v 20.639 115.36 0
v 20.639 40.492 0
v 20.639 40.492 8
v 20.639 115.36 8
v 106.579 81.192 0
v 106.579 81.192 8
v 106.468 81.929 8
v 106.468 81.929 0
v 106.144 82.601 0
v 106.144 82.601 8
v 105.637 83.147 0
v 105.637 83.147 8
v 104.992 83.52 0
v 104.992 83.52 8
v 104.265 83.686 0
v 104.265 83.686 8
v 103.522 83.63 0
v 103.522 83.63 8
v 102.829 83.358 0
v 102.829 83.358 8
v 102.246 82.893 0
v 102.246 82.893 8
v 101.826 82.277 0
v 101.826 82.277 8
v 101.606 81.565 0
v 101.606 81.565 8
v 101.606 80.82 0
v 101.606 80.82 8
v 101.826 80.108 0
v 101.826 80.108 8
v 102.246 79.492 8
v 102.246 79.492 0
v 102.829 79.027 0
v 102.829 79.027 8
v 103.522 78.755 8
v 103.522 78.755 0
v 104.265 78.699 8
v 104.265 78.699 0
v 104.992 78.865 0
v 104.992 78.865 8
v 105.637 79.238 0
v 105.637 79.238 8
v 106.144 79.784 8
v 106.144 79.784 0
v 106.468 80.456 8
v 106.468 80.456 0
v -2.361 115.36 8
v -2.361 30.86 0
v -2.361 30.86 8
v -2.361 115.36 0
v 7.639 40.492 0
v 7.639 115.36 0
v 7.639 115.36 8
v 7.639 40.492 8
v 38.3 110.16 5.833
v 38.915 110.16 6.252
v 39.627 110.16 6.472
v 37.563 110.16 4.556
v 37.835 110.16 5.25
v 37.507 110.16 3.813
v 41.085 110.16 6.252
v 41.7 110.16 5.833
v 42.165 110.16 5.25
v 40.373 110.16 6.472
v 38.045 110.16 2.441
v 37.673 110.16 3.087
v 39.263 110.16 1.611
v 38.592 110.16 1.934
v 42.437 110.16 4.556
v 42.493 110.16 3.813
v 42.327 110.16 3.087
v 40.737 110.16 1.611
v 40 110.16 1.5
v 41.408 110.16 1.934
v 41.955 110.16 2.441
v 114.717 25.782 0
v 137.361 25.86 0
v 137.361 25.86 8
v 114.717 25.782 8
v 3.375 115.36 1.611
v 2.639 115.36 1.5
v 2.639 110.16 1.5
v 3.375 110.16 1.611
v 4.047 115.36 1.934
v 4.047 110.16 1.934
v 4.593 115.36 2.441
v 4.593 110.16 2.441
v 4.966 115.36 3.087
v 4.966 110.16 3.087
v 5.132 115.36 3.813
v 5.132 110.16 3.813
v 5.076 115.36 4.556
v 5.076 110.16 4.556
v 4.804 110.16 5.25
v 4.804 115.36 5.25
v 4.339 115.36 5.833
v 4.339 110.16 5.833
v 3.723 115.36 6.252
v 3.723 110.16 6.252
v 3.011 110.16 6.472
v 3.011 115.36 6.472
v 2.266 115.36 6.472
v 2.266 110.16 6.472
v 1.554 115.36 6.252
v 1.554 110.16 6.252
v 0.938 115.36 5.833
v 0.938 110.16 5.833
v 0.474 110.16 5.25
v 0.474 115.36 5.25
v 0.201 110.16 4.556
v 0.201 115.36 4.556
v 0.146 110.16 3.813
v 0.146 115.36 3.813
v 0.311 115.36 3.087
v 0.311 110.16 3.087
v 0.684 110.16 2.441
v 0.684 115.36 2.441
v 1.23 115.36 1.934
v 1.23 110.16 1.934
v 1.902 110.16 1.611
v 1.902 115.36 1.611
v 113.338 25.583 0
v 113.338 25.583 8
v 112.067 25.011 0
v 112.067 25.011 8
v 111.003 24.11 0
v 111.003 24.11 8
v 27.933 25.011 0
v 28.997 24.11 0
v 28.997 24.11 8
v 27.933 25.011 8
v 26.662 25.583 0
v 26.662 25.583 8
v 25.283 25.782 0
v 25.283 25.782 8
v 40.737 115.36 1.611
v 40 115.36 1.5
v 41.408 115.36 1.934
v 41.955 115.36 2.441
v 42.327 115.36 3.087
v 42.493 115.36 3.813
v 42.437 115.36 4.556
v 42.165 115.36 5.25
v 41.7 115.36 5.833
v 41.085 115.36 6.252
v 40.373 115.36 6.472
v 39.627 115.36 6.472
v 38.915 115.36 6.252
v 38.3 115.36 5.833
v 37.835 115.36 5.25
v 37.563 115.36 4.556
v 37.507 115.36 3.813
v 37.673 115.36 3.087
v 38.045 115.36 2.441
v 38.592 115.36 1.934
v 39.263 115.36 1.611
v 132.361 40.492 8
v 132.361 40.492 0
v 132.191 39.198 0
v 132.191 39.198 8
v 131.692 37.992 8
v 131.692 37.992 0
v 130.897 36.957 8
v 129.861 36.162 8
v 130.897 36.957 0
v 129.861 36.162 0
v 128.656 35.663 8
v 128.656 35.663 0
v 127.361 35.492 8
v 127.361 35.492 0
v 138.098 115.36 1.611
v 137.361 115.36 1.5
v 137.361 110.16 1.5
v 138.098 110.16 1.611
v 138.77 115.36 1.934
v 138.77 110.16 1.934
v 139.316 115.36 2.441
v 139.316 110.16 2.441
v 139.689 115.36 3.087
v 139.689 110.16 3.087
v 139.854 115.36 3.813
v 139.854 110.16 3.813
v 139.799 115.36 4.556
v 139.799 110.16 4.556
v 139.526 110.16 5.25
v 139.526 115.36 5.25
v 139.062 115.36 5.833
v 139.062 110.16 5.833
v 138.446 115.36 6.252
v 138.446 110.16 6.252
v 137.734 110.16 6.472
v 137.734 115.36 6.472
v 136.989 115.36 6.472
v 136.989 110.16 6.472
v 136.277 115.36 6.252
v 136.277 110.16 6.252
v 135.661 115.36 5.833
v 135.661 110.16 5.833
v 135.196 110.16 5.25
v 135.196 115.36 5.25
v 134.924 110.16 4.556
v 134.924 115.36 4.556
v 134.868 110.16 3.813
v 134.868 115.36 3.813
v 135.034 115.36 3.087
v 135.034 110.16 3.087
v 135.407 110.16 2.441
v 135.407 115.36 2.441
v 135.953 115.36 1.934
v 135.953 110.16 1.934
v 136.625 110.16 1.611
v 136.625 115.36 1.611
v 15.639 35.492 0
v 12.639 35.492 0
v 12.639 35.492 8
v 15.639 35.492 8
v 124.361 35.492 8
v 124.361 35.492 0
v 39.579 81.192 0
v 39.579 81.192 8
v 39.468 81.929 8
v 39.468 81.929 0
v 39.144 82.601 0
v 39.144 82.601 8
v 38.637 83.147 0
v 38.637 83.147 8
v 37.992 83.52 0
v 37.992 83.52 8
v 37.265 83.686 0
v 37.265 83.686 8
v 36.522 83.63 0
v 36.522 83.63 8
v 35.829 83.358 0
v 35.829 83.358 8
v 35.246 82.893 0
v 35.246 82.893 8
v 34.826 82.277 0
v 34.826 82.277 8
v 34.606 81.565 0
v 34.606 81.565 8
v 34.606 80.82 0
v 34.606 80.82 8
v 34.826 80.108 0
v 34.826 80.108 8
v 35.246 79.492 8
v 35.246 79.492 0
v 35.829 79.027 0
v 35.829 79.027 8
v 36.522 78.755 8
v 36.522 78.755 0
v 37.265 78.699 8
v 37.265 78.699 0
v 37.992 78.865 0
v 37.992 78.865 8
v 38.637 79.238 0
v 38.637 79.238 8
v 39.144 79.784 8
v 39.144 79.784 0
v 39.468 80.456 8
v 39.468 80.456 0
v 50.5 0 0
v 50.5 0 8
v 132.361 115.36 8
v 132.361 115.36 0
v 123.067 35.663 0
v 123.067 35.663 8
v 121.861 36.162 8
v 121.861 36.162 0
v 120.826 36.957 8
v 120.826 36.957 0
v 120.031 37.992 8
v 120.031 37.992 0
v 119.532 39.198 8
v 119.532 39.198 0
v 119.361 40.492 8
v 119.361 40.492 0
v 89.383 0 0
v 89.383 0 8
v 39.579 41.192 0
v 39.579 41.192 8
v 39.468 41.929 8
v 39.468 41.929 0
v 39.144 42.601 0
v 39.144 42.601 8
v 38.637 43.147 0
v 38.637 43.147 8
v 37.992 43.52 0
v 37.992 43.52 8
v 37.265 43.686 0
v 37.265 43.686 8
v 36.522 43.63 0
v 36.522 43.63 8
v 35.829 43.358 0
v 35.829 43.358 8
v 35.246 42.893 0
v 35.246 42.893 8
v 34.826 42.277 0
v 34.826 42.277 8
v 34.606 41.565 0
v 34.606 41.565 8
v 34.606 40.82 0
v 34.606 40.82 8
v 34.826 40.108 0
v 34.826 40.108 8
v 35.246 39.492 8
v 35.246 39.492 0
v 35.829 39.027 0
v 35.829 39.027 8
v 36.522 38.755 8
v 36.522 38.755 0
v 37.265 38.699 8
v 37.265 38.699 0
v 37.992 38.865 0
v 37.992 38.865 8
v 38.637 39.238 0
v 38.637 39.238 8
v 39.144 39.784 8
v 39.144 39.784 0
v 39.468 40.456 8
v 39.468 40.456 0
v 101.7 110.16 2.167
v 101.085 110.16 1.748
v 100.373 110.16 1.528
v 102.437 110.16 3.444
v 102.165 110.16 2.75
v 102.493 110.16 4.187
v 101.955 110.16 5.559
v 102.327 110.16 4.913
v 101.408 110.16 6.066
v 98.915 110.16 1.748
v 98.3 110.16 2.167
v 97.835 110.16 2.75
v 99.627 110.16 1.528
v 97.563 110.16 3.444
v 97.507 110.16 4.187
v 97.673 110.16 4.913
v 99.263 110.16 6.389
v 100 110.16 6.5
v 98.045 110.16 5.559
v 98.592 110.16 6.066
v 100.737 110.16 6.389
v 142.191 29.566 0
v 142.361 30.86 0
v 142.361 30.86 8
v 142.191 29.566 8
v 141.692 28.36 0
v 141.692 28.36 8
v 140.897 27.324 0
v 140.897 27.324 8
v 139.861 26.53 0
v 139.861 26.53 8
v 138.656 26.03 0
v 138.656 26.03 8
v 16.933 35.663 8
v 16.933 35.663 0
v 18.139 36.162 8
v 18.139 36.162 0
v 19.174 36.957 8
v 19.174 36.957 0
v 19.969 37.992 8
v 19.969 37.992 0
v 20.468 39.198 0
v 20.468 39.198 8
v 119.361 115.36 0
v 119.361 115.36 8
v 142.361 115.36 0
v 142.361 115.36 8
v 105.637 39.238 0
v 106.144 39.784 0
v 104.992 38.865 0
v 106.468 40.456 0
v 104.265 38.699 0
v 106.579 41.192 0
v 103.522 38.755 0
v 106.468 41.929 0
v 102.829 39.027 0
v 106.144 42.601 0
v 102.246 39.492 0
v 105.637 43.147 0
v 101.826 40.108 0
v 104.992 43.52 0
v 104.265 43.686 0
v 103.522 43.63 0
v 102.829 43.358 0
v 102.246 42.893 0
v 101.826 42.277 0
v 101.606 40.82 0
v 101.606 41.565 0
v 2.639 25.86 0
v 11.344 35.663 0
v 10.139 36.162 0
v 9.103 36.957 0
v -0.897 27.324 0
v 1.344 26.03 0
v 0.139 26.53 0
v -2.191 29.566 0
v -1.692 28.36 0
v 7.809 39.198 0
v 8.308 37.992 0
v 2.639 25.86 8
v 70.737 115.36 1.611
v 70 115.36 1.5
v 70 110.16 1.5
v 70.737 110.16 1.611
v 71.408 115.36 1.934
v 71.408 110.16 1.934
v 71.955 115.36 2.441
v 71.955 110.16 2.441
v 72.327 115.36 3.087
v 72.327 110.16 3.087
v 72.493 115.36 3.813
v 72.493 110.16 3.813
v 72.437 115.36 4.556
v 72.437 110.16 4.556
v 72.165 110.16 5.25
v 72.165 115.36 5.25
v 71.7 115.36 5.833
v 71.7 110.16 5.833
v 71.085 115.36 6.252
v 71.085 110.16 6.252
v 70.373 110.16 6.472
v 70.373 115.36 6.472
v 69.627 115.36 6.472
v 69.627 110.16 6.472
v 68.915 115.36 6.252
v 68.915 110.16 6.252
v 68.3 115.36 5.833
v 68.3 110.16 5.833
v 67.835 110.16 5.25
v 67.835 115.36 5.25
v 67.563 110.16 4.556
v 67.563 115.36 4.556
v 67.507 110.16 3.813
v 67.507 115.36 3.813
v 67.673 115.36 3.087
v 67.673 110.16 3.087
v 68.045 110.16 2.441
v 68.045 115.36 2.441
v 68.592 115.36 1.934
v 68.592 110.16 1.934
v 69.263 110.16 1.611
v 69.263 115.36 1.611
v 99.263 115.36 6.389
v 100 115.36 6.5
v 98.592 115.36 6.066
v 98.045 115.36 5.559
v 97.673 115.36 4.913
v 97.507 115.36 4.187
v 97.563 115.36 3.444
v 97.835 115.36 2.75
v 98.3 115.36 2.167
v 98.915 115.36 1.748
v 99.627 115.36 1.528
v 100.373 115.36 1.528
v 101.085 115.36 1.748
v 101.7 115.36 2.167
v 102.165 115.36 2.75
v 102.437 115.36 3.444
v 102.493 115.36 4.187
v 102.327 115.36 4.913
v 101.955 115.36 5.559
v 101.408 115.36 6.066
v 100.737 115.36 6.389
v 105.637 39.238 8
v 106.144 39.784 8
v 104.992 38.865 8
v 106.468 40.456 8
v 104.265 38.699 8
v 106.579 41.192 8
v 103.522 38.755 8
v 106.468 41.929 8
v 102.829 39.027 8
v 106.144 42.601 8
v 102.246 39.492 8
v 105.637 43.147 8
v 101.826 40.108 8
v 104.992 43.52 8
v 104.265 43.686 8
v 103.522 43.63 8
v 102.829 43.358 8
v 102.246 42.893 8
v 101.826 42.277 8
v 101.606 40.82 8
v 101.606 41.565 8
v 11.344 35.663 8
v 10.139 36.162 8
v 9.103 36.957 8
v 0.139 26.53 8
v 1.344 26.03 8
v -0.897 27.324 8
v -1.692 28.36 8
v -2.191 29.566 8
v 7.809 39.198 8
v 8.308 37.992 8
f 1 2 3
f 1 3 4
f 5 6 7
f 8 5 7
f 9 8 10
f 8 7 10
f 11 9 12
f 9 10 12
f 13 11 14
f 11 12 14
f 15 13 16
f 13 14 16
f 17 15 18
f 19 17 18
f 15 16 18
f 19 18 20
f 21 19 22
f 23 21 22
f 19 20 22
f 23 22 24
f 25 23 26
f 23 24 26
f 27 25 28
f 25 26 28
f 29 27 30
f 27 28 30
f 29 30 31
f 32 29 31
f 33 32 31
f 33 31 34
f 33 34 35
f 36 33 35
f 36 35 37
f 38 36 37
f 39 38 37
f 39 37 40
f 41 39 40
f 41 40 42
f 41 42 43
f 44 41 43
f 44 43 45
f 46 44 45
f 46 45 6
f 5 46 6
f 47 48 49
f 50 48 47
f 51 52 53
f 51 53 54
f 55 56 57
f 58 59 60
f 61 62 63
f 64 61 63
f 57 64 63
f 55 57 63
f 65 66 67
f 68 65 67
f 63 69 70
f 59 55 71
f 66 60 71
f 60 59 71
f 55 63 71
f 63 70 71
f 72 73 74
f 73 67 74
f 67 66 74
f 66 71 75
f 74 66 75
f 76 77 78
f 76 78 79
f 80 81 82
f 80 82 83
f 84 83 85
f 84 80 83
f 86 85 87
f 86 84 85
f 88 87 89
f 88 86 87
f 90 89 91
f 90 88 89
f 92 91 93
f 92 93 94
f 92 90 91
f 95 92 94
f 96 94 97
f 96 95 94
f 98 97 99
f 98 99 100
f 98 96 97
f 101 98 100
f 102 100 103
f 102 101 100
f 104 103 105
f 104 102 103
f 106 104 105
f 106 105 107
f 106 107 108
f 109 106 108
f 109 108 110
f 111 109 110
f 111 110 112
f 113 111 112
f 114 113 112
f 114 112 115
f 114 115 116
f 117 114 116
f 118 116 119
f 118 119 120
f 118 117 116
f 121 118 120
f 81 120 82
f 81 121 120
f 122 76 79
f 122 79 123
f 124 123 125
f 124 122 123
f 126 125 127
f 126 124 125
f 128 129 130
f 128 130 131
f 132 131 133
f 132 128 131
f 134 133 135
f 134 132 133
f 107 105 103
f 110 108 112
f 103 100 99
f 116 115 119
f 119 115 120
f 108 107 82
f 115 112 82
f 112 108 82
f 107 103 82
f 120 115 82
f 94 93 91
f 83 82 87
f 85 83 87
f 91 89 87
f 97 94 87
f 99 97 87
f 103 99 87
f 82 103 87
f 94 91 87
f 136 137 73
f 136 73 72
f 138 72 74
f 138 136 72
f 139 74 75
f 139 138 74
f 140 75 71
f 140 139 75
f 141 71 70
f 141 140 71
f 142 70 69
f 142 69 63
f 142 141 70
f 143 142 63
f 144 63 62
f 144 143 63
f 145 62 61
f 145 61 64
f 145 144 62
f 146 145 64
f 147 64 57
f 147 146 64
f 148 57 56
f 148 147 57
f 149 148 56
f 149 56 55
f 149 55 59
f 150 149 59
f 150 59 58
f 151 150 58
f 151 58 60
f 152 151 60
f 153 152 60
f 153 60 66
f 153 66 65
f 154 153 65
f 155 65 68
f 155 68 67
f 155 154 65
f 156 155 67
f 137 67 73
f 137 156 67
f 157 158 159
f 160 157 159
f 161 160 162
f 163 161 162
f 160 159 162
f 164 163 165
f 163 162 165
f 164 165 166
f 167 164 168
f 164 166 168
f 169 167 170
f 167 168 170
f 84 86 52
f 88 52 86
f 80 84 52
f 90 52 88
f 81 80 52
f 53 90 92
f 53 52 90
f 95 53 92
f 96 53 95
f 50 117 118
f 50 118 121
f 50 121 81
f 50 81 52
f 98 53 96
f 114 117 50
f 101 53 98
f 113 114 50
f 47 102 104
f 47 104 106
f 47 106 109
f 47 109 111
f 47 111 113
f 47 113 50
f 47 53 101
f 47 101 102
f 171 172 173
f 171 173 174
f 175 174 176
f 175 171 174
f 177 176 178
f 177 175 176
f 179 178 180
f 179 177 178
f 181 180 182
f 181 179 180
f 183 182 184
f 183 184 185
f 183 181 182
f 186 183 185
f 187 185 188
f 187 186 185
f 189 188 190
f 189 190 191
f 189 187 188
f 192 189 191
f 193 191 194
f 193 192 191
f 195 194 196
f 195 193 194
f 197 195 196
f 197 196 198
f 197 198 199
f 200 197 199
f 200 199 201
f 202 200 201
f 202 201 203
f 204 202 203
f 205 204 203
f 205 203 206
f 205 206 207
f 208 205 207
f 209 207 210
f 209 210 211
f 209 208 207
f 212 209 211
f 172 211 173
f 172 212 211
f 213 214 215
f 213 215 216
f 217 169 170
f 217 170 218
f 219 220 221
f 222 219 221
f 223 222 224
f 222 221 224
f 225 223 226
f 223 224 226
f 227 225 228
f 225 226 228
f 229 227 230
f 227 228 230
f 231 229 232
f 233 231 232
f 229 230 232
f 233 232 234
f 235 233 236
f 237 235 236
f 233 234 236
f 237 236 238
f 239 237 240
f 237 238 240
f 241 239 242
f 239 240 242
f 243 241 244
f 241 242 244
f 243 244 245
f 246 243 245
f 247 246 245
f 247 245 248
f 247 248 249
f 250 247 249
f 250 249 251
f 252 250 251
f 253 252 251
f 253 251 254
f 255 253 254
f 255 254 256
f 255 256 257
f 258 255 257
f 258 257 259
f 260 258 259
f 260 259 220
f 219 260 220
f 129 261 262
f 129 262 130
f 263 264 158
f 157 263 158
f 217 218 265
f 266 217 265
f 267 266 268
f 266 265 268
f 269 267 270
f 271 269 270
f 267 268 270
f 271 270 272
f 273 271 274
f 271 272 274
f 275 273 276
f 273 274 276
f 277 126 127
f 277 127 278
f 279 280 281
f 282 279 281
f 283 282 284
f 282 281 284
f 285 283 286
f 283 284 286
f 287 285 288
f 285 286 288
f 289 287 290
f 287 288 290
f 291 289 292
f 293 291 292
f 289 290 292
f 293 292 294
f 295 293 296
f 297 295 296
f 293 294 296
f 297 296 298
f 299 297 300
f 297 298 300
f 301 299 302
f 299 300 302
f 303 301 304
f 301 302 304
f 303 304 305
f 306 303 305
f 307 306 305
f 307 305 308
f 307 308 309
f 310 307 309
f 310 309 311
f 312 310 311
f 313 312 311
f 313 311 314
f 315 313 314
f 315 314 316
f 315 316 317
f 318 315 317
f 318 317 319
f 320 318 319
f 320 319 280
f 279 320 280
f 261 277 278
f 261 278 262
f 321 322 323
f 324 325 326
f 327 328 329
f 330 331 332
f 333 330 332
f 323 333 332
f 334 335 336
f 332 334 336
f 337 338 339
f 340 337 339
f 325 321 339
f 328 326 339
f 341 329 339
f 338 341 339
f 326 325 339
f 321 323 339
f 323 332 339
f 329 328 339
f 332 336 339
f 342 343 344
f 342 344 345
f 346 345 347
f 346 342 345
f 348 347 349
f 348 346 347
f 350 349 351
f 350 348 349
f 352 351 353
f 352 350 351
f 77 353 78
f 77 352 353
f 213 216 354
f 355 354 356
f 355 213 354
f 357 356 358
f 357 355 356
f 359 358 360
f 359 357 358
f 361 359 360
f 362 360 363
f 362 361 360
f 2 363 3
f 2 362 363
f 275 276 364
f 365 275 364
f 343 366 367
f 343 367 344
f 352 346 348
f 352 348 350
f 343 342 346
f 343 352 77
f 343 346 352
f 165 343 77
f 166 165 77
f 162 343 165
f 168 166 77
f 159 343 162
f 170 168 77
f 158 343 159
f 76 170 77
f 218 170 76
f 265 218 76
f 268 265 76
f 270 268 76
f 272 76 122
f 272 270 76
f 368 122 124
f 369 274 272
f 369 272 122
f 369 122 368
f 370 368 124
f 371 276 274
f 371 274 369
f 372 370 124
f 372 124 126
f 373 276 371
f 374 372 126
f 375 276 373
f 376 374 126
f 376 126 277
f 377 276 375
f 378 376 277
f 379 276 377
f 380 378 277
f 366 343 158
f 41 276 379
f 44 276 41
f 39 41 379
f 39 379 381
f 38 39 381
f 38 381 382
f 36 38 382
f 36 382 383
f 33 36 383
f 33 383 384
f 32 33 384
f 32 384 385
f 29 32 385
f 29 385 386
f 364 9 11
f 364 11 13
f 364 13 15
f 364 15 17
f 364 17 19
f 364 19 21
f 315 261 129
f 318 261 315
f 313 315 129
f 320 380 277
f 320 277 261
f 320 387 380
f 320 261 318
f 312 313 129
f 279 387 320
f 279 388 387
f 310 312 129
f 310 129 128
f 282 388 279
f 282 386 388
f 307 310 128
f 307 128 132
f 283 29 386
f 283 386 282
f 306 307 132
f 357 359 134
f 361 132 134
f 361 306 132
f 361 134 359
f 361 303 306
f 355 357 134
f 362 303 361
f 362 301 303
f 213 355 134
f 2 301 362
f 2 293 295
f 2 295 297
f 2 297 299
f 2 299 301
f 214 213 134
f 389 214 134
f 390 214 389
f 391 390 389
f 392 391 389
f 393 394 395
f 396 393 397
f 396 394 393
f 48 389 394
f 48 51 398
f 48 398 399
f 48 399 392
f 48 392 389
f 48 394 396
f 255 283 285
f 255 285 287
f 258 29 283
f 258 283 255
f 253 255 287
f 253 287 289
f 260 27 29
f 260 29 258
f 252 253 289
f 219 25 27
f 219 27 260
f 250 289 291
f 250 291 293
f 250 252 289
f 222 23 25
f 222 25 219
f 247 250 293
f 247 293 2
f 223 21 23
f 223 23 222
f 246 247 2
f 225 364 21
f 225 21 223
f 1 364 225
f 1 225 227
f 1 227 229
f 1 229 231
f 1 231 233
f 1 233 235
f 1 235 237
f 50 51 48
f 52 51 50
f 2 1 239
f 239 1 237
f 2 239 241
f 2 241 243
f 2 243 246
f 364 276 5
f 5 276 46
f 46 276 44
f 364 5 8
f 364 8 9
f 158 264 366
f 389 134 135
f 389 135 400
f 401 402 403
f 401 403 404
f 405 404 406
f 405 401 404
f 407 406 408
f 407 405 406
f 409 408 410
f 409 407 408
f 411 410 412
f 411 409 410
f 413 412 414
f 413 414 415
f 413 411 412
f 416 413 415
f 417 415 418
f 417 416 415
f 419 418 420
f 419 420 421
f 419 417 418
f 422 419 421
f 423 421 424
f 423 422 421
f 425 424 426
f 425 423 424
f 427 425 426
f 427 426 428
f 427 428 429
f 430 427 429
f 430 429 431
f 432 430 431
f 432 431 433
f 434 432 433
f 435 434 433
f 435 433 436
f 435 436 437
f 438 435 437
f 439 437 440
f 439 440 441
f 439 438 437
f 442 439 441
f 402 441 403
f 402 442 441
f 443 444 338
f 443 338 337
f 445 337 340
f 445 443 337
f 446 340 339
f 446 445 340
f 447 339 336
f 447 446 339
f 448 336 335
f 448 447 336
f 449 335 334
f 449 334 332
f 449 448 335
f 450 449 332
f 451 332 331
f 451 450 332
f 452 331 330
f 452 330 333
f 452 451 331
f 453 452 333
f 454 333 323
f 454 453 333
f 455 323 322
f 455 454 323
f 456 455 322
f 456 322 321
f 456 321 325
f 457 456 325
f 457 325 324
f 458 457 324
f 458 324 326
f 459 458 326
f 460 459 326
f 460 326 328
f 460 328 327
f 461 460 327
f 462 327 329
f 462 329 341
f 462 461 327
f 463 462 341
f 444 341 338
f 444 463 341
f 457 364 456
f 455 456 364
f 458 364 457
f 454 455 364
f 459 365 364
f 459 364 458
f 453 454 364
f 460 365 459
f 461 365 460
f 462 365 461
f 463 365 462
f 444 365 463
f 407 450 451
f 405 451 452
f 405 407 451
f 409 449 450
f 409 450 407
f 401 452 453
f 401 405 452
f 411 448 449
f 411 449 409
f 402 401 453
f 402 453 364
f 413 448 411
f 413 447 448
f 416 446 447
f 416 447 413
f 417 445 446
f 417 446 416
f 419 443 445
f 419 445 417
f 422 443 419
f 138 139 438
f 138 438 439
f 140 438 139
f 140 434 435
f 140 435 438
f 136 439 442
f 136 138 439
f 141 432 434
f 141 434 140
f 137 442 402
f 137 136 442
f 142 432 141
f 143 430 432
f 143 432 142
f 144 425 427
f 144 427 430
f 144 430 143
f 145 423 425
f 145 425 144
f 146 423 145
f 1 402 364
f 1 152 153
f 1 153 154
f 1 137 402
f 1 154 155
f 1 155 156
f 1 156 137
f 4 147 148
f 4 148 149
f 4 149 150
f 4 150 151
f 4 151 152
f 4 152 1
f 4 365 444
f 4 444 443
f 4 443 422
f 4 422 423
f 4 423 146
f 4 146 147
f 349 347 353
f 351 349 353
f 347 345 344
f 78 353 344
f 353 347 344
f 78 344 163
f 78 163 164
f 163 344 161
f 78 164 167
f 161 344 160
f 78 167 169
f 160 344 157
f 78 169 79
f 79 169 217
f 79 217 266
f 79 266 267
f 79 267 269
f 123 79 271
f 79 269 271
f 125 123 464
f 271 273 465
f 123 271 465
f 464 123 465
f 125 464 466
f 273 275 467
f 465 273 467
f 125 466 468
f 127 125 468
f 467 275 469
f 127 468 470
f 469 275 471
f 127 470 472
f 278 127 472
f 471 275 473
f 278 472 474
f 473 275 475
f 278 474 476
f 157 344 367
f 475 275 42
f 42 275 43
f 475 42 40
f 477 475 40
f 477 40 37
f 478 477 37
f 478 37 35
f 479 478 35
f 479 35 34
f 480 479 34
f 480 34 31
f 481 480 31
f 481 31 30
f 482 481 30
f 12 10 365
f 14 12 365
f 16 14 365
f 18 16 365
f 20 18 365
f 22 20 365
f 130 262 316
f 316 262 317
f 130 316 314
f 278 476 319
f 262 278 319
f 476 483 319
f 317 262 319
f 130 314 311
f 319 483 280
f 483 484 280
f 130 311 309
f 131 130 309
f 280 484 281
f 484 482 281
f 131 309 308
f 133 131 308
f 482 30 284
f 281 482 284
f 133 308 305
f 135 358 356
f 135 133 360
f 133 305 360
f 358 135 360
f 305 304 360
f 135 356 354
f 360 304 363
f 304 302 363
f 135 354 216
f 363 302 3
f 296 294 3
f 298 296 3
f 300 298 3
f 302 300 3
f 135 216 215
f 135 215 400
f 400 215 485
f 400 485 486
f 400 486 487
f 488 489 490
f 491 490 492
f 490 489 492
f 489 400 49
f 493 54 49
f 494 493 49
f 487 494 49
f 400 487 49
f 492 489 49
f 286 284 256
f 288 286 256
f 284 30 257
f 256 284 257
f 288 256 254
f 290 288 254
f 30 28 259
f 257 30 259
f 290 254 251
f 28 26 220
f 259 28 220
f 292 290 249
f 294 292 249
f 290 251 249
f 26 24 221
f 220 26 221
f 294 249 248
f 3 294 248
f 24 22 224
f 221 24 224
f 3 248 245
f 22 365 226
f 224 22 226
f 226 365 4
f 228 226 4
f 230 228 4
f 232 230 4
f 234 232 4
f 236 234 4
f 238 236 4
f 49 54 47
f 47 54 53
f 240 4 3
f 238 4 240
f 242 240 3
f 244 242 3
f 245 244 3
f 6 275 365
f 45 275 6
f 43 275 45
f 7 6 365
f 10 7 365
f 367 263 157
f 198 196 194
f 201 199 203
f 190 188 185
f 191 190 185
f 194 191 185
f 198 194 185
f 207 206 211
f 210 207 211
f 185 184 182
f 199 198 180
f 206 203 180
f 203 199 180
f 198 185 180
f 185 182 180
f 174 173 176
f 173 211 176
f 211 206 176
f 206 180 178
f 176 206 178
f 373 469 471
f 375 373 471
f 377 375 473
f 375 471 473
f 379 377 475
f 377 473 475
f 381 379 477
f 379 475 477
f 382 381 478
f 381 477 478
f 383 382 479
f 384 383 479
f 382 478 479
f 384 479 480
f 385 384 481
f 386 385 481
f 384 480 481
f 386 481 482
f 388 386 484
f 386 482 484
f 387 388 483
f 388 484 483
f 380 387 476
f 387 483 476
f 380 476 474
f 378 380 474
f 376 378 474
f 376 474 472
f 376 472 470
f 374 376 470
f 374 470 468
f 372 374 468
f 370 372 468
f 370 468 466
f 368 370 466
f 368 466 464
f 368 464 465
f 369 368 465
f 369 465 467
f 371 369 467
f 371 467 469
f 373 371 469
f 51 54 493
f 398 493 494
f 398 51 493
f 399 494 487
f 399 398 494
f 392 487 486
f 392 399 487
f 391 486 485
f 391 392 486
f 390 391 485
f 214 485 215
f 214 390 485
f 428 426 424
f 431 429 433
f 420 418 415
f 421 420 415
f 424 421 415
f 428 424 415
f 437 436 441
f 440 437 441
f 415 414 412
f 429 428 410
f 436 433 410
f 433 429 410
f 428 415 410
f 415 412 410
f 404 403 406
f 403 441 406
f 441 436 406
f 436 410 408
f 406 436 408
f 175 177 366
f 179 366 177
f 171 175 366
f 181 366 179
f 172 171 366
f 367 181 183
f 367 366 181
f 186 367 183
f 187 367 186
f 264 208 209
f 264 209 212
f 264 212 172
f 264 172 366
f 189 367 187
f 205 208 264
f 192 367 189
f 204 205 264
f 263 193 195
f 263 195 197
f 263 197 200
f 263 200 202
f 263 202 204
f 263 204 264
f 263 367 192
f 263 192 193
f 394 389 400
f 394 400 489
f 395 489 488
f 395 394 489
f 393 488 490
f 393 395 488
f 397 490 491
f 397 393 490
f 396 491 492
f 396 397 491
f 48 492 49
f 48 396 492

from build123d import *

# Parameters (mm, degrees)
BOSS_EXTRUDE1_DEPTH    = 8
SKETCH2_W              = 45
SKETCH2_H              = 52
CUT_EXTRUDE1_DEPTH     = 342.206659287
SPLIT1_SURFACE_1_BACK  = 343.199
SPLIT1_SURFACE_1_DEPTH = 686.398
SPLIT1_SURFACE_2_BACK  = 343.199
SPLIT1_SURFACE_2_DEPTH = 686.398
SKETCH5_R              = 2.5
CUT_EXTRUDE6_DEPTH     = 5.2
SKETCH4_R              = 2.5
CUT_EXTRUDE7_DEPTH     = 5.2
SKETCH6_R              = 2.5
CUT_EXTRUDE8_DEPTH     = 184.408541223


with BuildPart() as part:
    # Sketch1 → Boss-Extrude1 (new body)
    with BuildSketch(Plane.XY):
        with BuildLine():
            Line((70, 309.985818768), (85.299227191, 309.985818768))
            ThreePointArc((85.299227191, 309.985818768), (88.489017574, 308.836174247), (90.211957942, 305.915913694))
            Line((90.211957942, 305.915913694), (96.672728921, 271.790334282))
            ThreePointArc((96.672728921, 271.790334282), (97.06575438, 270.906904614), (97.621470019, 270.115641625))
            Line((97.621470019, 270.115641625), (139.950460317, 220.786053348))
            ThreePointArc((139.950460317, 220.786053348), (141.739336996, 217.746026552), (142.361429131, 214.274017901))
            Line((142.361429131, 214.274017901), (142.361429131, 30.859943174))
            ThreePointArc((142.361429131, 30.859943174), (140.896963037, 27.324409268), (137.361429131, 25.859943174))
            Line((137.361429131, 25.859943174), (114.717190871, 25.782318449))
            ThreePointArc((114.717190871, 25.782318449), (112.681998989, 25.341726514), (111.002773989, 24.110332733))
            Line((111.002773989, 24.110332733), (89.38285929, 0))
            Line((89.38285929, 0), (50.5, 0))
            Line((50.5, 0), (28.997226011, 24.110332733))
            ThreePointArc((28.997226011, 24.110332733), (27.318001011, 25.341726514), (25.282809129, 25.782318449))
            Line((25.282809129, 25.782318449), (2.638570869, 25.859943174))
            ThreePointArc((2.638570869, 25.859943174), (-0.896963037, 27.324409268), (-2.361429131, 30.859943174))
            Line((-2.361429131, 30.859943174), (-2.361429131, 214.274017901))
            ThreePointArc((-2.361429131, 214.274017901), (-1.739336996, 217.746026552), (0.049539683, 220.786053348))
            Line((0.049539683, 220.786053348), (42.261389271, 270.115641625))
            ThreePointArc((42.261389271, 270.115641625), (42.81710491, 270.906904614), (43.210130369, 271.790334282))
            Line((43.210130369, 271.790334282), (49.724618218, 305.923183314))
            ThreePointArc((49.724618218, 305.923183314), (51.449026762, 308.838533573), (54.635967087, 309.985818768))
            Line((54.635967087, 309.985818768), (70, 309.985818768))
        make_face()
        with BuildLine():
            Line((12.638570869, 35.492492662), (15.638570869, 35.492492662))
            ThreePointArc((15.638570869, 35.492492662), (19.174104775, 36.956958756), (20.638570869, 40.492492662))
            Line((20.638570869, 40.492492662), (20.638570869, 213.625959477))
            Line((20.638570869, 213.625959477), (7.638570869, 213.625959477))
            Line((7.638570869, 213.625959477), (7.638570869, 40.492492662))
            ThreePointArc((7.638570869, 40.492492662), (9.103036963, 36.956958756), (12.638570869, 35.492492662))
        make_face(mode=Mode.SUBTRACT)
        with BuildLine():
            Line((127.361429131, 35.492492662), (124.361429131, 35.492492662))
            ThreePointArc((124.361429131, 35.492492662), (120.825895225, 36.956958756), (119.361429131, 40.492492662))
            Line((119.361429131, 40.492492662), (119.361429131, 213.625959477))
            Line((119.361429131, 213.625959477), (132.361429131, 213.625959477))
            Line((132.361429131, 213.625959477), (132.361429131, 40.492492662))
            ThreePointArc((132.361429131, 40.492492662), (130.896963037, 36.956958756), (127.361429131, 35.492492662))
        make_face(mode=Mode.SUBTRACT)
    extrude(amount=BOSS_EXTRUDE1_DEPTH)

    # Sketch2 → Cut-Extrude1 (cut, through all)
    with BuildSketch(Plane.XY.offset(8)):
        with Locations((69.88285929, 180.008918923)):
            Rectangle(SKETCH2_W, SKETCH2_H)
    extrude(amount=-CUT_EXTRUDE1_DEPTH, mode=Mode.SUBTRACT)


with BuildPart() as body_2:
    # Split1: the piece behind the surface
    add(part.part)
    # Split1 surface: a surface, the sketch's curves swept straight by 686.398 mm
    with BuildLine(Plane(origin=(0, 0, 0), x_dir=(-1, 0, 0), z_dir=(0, 0, -1)).offset(-SPLIT1_SURFACE_1_BACK), mode=Mode.PRIVATE) as split1_surface_1_path:
        Line((-142.361429131, 115.359943174), (2.361429131, 115.359943174))
    split1_surface_1 = Shell.extrude(split1_surface_1_path.wire(), (0 * SPLIT1_SURFACE_1_DEPTH, 0 * SPLIT1_SURFACE_1_DEPTH, -1 * SPLIT1_SURFACE_1_DEPTH))
    split(bisect_by=split1_surface_1, keep=Keep.BOTTOM)

    # Sketch5 → Cut-Extrude6 (cut)
    with BuildSketch(Plane(origin=(0, 115.359943174, -115.359943174), x_dir=(1, 0, 0), z_dir=(0, -1, 0))):
        with Locations(Location((100, 119.359943174, 0), (0, 0, 90))):
            Circle(SKETCH5_R)
        with Locations(Location((2.638570869, 119.359943174, 0), (0, 0, 270))):
            Circle(SKETCH5_R)
        with Locations(Location((40, 119.359943174, 0), (0, 0, 270))):
            Circle(SKETCH5_R)
        with Locations(Location((70, 119.359943174, 0), (0, 0, 270))):
            Circle(SKETCH5_R)
        with Locations(Location((137.361429131, 119.359943174, 0), (0, 0, 270))):
            Circle(SKETCH5_R)
    extrude(amount=CUT_EXTRUDE6_DEPTH, mode=Mode.SUBTRACT)

    # Sketch6 → Cut-Extrude8 (cut, through all)
    with BuildSketch(Plane.XY.offset(8)):
        with Locations((37.078570869, 81.192492662)):
            Circle(SKETCH6_R)
        with Locations((104.078570869, 81.192492662)):
            Circle(SKETCH6_R)
        with Locations((104.078570869, 41.192492662)):
            Circle(SKETCH6_R)
        with Locations((37.078570869, 41.192492662)):
            Circle(SKETCH6_R)
    extrude(amount=-CUT_EXTRUDE8_DEPTH, mode=Mode.SUBTRACT)


with BuildPart() as part_1:
    add(part.part)

    # Split1: split by a surface, the side it looks to stays
    # Split1 surface: a surface, the sketch's curves swept straight by 686.398 mm
    with BuildLine(Plane(origin=(0, 0, 0), x_dir=(-1, 0, 0), z_dir=(0, 0, -1)).offset(-SPLIT1_SURFACE_2_BACK), mode=Mode.PRIVATE) as split1_surface_2_path:
        Line((-142.361429131, 115.359943174), (2.361429131, 115.359943174))
    split1_surface_2 = Shell.extrude(split1_surface_2_path.wire(), (0 * SPLIT1_SURFACE_2_DEPTH, 0 * SPLIT1_SURFACE_2_DEPTH, -1 * SPLIT1_SURFACE_2_DEPTH))
    split(bisect_by=split1_surface_2, keep=Keep.TOP)

    # Sketch4 → Cut-Extrude7 (cut)
    with BuildSketch(Plane(origin=(0, 115.359943174, 0), x_dir=(-1, 0, 0), z_dir=(0, -1, 0))):
        with Locations(Location((-70, -4, 0), (0, 0, 90))):
            Circle(SKETCH4_R)
        with Locations(Location((-40, -4, 0), (0, 0, 90))):
            Circle(SKETCH4_R)
        with Locations(Location((-100, -4, 0), (0, 0, 270))):
            Circle(SKETCH4_R)
        with Locations(Location((-137.361429131, -4, 0), (0, 0, 90))):
            Circle(SKETCH4_R)
        with Locations(Location((-2.638570869, -4, 0), (0, 0, 90))):
            Circle(SKETCH4_R)
    extrude(amount=-CUT_EXTRUDE7_DEPTH, mode=Mode.SUBTRACT)


solid = body_2.part
